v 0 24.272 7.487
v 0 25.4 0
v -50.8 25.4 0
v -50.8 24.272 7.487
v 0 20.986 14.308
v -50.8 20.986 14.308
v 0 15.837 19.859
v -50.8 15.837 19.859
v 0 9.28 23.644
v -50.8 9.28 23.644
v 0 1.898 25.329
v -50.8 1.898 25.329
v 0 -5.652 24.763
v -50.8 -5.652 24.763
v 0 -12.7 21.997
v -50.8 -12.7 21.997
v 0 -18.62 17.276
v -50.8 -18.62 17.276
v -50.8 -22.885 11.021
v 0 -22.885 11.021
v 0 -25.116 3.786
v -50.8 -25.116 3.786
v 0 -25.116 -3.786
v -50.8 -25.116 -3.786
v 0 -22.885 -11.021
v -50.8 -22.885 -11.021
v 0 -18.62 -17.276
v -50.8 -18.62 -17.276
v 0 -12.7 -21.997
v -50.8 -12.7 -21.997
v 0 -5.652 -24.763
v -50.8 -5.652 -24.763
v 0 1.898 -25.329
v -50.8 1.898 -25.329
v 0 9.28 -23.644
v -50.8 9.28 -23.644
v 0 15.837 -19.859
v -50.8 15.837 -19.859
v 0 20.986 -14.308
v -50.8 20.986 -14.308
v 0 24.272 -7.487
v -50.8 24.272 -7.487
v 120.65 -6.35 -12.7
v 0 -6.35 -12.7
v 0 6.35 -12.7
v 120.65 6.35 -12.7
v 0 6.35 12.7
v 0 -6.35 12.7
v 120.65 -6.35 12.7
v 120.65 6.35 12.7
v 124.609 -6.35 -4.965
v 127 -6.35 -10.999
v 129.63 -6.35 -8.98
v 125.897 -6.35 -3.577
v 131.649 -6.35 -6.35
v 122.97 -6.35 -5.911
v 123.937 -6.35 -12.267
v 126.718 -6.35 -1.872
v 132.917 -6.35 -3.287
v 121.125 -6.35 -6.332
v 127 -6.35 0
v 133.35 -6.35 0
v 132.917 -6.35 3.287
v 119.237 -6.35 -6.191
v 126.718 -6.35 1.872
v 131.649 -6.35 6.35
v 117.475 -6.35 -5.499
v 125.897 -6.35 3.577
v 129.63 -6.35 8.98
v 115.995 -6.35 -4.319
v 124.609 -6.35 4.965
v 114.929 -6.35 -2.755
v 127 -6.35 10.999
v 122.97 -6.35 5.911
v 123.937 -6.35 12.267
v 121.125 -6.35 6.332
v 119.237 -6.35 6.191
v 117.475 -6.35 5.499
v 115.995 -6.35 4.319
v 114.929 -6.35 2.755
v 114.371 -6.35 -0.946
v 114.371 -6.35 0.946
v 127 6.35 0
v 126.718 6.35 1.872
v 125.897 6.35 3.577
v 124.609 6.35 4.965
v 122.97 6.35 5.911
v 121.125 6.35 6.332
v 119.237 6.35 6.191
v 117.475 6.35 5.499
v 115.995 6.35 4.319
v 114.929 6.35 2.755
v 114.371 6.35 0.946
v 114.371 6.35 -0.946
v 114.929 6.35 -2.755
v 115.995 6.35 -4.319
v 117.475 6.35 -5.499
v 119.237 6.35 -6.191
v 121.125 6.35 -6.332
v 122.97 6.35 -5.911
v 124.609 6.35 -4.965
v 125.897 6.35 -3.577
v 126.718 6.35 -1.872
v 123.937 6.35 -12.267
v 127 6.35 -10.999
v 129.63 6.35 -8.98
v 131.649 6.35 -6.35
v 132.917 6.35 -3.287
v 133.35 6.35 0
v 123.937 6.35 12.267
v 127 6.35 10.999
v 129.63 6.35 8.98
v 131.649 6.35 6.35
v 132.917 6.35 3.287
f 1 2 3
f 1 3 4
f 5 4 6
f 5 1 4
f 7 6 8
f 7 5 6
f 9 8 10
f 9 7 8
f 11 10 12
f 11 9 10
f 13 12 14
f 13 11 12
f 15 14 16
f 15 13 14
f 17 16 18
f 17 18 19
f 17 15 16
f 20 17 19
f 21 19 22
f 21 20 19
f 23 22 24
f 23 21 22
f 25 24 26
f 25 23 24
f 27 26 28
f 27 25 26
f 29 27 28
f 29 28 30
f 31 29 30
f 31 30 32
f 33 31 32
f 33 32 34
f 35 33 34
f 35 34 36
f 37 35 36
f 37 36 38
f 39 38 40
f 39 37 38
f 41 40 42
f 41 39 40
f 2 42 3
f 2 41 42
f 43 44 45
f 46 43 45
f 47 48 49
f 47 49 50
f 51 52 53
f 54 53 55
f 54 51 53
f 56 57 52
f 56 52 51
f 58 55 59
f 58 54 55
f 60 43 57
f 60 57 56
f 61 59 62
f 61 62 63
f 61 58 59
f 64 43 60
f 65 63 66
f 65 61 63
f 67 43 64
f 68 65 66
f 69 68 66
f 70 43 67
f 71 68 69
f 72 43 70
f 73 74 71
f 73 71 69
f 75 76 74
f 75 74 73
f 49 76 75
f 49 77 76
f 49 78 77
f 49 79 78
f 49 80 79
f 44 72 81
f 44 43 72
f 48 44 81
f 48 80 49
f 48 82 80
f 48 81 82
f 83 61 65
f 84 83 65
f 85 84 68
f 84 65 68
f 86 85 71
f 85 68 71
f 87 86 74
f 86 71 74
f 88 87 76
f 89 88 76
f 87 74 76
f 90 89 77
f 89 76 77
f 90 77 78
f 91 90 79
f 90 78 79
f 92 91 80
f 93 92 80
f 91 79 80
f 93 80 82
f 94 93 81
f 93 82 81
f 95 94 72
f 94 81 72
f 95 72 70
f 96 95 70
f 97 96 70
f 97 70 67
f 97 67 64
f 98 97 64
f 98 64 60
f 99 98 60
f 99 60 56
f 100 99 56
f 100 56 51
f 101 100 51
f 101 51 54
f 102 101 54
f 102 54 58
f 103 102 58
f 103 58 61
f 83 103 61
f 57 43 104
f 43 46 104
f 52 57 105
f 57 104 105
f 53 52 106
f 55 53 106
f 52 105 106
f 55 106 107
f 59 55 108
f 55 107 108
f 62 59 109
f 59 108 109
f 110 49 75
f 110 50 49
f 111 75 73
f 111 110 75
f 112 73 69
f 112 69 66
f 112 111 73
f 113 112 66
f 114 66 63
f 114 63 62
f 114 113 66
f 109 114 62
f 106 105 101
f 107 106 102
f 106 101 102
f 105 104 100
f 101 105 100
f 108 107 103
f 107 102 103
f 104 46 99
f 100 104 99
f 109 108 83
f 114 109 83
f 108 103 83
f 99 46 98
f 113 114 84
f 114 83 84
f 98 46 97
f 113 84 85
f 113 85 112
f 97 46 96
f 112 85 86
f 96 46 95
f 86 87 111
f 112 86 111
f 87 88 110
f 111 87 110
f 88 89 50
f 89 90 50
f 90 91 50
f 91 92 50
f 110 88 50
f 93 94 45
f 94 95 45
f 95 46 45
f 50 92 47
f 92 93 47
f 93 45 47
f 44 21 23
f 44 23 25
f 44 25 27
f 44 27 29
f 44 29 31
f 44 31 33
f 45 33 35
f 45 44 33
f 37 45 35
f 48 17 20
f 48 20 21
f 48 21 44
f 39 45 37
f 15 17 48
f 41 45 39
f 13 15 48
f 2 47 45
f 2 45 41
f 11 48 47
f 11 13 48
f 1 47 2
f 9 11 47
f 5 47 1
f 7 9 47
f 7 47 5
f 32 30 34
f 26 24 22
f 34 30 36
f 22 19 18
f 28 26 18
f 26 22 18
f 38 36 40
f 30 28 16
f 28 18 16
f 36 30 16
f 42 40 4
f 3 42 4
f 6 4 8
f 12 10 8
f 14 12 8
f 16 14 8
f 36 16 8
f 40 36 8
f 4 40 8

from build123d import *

# Parameters (mm, degrees)
F0_R     = 25.4
F1_DEPTH = 50.8
F2_W     = 12.7
F2_H     = 25.4
F3_DEPTH = 133.35
F4_R     = 12.69999
F5_R     = 6.35
F6_DEPTH = 31.751


# Not quite as in the source:
# - a fillet or chamfer is up to 0.001 mm smaller than in the source, because OpenCascade refuses the exact size


with BuildPart() as f1:
    # F0 (on Right) → F1 (new body)
    with BuildSketch(Plane.YZ):
        Circle(F0_R)
    extrude(amount=-F1_DEPTH)

    # F2 (on face) → F3 (join)
    with BuildSketch(Plane.YZ):
        Rectangle(F2_W, F2_H)
    extrude(amount=F3_DEPTH)

    # F4 (radius 12.7 in the source; OpenCascade refuses exactly that, so slightly less here)
    f4_edges = [f1.edges().sort_by_distance(p)[0] for p in [
        (133.35, 0, 12.7),
        (133.35, 0, -12.7),
    ]]
    fillet(f4_edges, radius=F4_R)

    # F5 (on face) → F6 (cut, through all)
    with BuildSketch(Plane.XZ.offset(6.35)):
        with Locations((120.65, 0)):
            Circle(F5_R)
    extrude(amount=-F6_DEPTH, mode=Mode.SUBTRACT)


solid = f1.part
